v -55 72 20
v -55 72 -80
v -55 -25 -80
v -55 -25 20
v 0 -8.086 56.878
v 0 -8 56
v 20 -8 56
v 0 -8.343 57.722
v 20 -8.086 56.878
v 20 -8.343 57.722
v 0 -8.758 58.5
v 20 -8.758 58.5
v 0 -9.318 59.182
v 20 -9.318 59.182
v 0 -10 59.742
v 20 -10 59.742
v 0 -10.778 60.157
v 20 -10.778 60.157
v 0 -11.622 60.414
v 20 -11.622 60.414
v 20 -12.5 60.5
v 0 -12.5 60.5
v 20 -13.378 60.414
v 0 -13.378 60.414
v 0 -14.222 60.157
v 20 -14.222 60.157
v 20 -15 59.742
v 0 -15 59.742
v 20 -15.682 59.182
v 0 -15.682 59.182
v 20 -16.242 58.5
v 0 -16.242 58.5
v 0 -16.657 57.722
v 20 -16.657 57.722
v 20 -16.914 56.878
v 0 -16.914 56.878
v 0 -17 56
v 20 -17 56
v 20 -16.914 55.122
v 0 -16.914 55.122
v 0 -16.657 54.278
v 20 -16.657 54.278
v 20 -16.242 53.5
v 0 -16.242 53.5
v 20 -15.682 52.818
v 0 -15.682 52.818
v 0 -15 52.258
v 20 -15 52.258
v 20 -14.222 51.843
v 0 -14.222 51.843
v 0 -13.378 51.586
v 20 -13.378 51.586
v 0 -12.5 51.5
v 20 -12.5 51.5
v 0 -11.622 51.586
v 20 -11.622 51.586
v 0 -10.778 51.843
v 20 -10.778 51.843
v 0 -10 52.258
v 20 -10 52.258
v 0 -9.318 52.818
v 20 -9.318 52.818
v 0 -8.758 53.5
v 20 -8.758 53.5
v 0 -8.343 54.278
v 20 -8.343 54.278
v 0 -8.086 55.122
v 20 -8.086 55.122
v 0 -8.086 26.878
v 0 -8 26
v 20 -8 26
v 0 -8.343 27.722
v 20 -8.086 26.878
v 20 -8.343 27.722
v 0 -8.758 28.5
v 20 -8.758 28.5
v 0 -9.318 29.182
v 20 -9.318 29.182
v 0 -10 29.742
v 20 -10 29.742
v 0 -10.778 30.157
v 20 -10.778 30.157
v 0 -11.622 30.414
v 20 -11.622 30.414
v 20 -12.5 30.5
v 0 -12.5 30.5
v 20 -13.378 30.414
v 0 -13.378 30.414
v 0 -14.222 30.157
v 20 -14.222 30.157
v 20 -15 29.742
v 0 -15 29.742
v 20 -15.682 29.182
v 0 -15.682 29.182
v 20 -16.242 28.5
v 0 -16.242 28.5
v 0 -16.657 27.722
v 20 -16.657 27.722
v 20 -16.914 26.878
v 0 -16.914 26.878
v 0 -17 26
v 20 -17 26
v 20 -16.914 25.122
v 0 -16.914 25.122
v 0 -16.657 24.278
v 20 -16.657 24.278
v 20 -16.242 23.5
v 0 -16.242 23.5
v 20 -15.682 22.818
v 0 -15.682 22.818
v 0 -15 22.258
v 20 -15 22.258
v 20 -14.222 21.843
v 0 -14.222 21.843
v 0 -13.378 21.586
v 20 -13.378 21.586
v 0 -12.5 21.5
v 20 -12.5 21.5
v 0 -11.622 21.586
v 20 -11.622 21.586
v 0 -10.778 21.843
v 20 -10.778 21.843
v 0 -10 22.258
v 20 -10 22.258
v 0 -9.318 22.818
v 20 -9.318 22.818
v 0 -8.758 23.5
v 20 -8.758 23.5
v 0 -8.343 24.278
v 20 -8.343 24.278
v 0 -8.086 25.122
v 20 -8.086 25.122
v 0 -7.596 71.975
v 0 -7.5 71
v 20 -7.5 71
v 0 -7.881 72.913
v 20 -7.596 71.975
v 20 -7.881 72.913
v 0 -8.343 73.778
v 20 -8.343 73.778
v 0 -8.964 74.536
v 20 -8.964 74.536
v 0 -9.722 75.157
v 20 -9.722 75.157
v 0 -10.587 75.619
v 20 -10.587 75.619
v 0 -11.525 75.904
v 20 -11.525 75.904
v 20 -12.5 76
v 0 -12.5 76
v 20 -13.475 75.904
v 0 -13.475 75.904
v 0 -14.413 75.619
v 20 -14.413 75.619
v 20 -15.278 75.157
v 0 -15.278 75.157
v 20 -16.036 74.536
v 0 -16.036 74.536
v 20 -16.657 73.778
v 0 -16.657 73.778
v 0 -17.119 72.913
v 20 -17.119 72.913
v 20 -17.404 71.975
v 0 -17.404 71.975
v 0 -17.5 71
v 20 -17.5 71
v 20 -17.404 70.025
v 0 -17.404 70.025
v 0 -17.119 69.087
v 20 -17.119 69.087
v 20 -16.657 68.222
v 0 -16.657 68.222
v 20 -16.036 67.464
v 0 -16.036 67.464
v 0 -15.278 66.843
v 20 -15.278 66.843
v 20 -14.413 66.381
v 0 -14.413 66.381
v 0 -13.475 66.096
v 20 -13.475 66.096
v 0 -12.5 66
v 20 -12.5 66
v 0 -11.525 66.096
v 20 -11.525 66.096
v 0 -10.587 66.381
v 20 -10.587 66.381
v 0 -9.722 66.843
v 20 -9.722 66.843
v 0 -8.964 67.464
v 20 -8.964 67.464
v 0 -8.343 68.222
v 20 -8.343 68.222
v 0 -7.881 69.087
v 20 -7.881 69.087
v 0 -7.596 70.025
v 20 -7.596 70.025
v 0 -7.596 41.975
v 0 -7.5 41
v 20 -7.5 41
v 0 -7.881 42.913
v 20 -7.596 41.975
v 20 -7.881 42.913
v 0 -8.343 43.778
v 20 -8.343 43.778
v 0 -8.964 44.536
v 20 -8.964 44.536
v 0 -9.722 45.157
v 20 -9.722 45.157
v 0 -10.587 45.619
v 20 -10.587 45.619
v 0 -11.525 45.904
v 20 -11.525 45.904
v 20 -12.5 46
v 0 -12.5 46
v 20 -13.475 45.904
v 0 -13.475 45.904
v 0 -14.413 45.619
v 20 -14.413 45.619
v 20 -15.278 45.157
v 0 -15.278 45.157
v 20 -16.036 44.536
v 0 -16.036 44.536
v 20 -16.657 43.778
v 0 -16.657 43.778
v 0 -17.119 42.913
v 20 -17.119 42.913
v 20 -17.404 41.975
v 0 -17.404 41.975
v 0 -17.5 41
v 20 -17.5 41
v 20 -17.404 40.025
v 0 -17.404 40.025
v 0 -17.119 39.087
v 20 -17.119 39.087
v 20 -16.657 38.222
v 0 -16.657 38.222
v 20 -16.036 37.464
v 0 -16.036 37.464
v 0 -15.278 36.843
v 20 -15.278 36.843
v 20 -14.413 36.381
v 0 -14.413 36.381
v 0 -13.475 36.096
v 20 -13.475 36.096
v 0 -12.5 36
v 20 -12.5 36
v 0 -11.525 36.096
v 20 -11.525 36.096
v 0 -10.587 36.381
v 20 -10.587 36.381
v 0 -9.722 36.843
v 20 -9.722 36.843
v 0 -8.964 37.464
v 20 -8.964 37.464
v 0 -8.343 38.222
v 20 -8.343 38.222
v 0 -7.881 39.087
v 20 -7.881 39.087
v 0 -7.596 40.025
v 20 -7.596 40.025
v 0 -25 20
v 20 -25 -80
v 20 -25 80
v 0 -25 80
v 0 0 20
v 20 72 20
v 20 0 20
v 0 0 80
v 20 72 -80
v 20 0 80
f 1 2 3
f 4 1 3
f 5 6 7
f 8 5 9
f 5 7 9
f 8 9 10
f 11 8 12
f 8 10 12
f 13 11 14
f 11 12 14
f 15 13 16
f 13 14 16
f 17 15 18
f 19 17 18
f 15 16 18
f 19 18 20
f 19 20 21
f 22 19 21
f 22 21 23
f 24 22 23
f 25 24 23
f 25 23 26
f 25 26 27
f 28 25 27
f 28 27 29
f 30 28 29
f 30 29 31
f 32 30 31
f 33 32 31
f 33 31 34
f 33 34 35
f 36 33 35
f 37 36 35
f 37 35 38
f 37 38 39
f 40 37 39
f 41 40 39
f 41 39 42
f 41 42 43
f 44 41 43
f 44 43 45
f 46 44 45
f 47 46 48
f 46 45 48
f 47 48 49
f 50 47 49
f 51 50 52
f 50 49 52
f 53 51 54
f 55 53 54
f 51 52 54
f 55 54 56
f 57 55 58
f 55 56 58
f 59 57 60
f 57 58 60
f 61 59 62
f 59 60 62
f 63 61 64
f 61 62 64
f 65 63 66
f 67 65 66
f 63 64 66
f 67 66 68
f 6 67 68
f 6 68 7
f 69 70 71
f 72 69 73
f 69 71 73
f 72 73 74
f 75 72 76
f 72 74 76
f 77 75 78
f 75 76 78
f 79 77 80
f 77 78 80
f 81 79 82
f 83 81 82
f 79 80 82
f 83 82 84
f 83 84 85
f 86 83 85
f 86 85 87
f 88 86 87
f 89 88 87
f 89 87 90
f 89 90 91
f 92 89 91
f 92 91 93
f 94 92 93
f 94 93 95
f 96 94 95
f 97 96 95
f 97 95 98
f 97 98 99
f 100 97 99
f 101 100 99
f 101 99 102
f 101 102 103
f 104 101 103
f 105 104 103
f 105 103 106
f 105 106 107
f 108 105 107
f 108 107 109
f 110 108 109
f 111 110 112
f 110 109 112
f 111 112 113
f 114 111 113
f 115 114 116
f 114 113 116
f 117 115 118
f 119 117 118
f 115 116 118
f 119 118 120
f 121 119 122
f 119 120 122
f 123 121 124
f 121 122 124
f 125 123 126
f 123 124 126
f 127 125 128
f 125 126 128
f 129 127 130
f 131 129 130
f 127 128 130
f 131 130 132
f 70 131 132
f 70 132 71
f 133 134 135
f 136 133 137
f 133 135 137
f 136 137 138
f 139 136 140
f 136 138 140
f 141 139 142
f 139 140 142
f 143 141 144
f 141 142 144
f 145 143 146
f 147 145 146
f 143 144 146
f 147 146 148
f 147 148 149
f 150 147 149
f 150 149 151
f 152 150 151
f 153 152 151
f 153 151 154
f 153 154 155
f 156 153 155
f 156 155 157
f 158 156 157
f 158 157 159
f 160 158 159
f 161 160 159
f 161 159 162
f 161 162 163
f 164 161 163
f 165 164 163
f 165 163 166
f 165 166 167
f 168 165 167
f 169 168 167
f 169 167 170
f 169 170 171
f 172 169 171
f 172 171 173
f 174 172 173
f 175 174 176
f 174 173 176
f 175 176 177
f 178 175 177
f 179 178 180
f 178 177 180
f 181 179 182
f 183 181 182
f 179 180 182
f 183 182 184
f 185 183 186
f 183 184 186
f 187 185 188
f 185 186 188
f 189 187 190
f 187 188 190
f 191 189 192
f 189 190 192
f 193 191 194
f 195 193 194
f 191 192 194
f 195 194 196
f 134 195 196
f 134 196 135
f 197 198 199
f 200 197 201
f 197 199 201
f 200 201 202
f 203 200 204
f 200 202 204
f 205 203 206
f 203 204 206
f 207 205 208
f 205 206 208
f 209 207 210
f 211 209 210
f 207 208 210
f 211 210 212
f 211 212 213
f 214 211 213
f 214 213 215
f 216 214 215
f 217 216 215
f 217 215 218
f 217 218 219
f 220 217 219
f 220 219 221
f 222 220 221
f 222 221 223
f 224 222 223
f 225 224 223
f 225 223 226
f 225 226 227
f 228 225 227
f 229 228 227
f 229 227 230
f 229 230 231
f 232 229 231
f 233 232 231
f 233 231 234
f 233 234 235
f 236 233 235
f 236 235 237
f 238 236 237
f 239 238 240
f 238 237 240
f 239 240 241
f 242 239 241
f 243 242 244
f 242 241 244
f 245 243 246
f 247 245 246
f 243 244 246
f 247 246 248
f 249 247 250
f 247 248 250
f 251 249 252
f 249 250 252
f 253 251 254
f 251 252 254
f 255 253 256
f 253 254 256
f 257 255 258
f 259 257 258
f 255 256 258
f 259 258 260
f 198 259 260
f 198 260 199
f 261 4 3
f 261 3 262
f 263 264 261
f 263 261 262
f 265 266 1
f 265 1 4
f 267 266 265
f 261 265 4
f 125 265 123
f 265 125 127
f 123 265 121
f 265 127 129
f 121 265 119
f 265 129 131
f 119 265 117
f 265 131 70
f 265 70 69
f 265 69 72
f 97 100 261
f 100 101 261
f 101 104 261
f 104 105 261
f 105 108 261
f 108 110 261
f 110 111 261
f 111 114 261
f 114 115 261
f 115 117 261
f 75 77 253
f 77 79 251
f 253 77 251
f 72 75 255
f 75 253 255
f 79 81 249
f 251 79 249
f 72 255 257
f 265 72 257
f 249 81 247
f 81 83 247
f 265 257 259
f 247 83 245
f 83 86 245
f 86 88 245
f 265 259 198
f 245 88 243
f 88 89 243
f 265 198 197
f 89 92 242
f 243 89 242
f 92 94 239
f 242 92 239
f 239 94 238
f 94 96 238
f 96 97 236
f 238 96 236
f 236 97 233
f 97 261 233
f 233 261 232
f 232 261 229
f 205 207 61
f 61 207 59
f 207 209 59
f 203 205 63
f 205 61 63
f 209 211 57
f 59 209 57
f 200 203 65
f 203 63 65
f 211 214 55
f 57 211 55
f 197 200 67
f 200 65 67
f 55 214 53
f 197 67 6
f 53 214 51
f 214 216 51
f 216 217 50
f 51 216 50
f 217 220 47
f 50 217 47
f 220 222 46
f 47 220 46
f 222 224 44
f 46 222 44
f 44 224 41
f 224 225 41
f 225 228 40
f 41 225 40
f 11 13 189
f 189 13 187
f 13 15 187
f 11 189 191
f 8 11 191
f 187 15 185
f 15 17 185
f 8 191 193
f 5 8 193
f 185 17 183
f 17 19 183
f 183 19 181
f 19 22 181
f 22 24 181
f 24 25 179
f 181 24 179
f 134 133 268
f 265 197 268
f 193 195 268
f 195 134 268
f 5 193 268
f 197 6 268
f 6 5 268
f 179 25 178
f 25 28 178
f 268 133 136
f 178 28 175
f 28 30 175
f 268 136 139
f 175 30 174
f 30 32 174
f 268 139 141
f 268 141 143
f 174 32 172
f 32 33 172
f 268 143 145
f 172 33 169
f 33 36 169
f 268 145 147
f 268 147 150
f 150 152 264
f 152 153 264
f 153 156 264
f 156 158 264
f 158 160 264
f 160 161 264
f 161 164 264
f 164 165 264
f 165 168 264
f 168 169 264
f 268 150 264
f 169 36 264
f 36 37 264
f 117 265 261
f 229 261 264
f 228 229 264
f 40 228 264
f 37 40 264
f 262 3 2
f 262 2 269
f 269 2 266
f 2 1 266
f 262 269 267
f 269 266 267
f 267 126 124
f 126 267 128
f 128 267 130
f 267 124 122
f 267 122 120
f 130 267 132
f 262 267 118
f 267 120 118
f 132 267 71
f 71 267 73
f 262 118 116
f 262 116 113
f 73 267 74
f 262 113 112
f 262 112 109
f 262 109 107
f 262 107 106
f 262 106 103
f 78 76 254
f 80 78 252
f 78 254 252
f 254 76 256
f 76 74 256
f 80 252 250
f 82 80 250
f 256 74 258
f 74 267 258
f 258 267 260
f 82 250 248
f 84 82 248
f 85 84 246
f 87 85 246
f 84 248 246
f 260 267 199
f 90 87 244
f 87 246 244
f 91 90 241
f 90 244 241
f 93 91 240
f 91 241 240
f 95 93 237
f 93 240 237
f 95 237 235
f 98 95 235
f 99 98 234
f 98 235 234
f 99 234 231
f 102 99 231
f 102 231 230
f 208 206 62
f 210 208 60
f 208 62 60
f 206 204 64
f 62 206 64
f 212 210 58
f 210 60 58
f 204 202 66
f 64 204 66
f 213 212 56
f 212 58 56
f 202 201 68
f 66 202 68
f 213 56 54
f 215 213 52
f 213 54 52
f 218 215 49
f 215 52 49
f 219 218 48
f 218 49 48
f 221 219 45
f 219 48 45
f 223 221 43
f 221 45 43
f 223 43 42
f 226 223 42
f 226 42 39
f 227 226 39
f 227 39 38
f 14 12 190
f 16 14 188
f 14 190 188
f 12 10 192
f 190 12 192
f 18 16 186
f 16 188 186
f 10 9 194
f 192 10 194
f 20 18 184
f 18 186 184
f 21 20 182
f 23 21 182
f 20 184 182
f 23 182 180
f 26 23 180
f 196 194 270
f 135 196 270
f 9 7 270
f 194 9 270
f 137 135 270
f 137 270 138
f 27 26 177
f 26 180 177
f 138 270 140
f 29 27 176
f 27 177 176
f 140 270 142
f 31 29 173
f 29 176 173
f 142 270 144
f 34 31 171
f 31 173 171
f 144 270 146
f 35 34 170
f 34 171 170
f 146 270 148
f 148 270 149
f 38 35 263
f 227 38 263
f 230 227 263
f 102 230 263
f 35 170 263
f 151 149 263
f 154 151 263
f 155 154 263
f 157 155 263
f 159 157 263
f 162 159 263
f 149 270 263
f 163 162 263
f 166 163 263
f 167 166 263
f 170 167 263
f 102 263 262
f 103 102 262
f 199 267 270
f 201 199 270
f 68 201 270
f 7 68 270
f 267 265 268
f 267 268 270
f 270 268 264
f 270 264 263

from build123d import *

# Parameters (mm, degrees)
F0_W     = 20
F0_H     = 25
F1_DEPTH = 80
F2_R     = 5
F2_R_2   = 4.5
F3_DEPTH = 25
F4_W     = 20
F4_H     = 20
F5_DEPTH = 72
F6_W     = 97
F6_H     = 20
F7_DEPTH = 55
F8_W     = 75
F8_H     = 97
F9_DEPTH = 80


with BuildPart() as f1:
    # F0 (on Top) → F1 (new body)
    with BuildSketch(Plane.XY):
        with Locations((10, -12.5)):
            Rectangle(F0_W, F0_H)
    extrude(amount=F1_DEPTH)

    # F2 (on face) → F3 (cut)
    with BuildSketch(Plane.YZ.offset(20)):
        with Locations((-12.5, 71)):
            Circle(F2_R)
        with Locations((-12.5, 56)):
            Circle(F2_R_2)
        with Locations((-12.5, 41)):
            Circle(F2_R)
        with Locations((-12.5, 26)):
            Circle(F2_R_2)
    extrude(amount=-F3_DEPTH, mode=Mode.SUBTRACT)

    # F4 (on face) → F5 (join)
    with BuildSketch(Plane(origin=(0, 0, 0), x_dir=(-1, 0, 0), z_dir=(0, 1, 0))):
        with Locations((-10, 10)):
            Rectangle(F4_W, F4_H)
    extrude(amount=F5_DEPTH)

    # F6 (on face) → F7 (join)
    with BuildSketch(Plane(origin=(0, 0, 0), x_dir=(0, -1, 0), z_dir=(-1, 0, 0))):
        with Locations((-23.5, 10)):
            Rectangle(F6_W, F6_H)
    extrude(amount=F7_DEPTH)

    # F8 (on face) → F9 (join)
    with BuildSketch(Plane(origin=(0, 0, 0), x_dir=(1, 0, 0), z_dir=(0, 0, -1))):
        with Locations((-17.5, -23.5)):
            Rectangle(F8_W, F8_H)
    extrude(amount=F9_DEPTH)


solid = f1.part
